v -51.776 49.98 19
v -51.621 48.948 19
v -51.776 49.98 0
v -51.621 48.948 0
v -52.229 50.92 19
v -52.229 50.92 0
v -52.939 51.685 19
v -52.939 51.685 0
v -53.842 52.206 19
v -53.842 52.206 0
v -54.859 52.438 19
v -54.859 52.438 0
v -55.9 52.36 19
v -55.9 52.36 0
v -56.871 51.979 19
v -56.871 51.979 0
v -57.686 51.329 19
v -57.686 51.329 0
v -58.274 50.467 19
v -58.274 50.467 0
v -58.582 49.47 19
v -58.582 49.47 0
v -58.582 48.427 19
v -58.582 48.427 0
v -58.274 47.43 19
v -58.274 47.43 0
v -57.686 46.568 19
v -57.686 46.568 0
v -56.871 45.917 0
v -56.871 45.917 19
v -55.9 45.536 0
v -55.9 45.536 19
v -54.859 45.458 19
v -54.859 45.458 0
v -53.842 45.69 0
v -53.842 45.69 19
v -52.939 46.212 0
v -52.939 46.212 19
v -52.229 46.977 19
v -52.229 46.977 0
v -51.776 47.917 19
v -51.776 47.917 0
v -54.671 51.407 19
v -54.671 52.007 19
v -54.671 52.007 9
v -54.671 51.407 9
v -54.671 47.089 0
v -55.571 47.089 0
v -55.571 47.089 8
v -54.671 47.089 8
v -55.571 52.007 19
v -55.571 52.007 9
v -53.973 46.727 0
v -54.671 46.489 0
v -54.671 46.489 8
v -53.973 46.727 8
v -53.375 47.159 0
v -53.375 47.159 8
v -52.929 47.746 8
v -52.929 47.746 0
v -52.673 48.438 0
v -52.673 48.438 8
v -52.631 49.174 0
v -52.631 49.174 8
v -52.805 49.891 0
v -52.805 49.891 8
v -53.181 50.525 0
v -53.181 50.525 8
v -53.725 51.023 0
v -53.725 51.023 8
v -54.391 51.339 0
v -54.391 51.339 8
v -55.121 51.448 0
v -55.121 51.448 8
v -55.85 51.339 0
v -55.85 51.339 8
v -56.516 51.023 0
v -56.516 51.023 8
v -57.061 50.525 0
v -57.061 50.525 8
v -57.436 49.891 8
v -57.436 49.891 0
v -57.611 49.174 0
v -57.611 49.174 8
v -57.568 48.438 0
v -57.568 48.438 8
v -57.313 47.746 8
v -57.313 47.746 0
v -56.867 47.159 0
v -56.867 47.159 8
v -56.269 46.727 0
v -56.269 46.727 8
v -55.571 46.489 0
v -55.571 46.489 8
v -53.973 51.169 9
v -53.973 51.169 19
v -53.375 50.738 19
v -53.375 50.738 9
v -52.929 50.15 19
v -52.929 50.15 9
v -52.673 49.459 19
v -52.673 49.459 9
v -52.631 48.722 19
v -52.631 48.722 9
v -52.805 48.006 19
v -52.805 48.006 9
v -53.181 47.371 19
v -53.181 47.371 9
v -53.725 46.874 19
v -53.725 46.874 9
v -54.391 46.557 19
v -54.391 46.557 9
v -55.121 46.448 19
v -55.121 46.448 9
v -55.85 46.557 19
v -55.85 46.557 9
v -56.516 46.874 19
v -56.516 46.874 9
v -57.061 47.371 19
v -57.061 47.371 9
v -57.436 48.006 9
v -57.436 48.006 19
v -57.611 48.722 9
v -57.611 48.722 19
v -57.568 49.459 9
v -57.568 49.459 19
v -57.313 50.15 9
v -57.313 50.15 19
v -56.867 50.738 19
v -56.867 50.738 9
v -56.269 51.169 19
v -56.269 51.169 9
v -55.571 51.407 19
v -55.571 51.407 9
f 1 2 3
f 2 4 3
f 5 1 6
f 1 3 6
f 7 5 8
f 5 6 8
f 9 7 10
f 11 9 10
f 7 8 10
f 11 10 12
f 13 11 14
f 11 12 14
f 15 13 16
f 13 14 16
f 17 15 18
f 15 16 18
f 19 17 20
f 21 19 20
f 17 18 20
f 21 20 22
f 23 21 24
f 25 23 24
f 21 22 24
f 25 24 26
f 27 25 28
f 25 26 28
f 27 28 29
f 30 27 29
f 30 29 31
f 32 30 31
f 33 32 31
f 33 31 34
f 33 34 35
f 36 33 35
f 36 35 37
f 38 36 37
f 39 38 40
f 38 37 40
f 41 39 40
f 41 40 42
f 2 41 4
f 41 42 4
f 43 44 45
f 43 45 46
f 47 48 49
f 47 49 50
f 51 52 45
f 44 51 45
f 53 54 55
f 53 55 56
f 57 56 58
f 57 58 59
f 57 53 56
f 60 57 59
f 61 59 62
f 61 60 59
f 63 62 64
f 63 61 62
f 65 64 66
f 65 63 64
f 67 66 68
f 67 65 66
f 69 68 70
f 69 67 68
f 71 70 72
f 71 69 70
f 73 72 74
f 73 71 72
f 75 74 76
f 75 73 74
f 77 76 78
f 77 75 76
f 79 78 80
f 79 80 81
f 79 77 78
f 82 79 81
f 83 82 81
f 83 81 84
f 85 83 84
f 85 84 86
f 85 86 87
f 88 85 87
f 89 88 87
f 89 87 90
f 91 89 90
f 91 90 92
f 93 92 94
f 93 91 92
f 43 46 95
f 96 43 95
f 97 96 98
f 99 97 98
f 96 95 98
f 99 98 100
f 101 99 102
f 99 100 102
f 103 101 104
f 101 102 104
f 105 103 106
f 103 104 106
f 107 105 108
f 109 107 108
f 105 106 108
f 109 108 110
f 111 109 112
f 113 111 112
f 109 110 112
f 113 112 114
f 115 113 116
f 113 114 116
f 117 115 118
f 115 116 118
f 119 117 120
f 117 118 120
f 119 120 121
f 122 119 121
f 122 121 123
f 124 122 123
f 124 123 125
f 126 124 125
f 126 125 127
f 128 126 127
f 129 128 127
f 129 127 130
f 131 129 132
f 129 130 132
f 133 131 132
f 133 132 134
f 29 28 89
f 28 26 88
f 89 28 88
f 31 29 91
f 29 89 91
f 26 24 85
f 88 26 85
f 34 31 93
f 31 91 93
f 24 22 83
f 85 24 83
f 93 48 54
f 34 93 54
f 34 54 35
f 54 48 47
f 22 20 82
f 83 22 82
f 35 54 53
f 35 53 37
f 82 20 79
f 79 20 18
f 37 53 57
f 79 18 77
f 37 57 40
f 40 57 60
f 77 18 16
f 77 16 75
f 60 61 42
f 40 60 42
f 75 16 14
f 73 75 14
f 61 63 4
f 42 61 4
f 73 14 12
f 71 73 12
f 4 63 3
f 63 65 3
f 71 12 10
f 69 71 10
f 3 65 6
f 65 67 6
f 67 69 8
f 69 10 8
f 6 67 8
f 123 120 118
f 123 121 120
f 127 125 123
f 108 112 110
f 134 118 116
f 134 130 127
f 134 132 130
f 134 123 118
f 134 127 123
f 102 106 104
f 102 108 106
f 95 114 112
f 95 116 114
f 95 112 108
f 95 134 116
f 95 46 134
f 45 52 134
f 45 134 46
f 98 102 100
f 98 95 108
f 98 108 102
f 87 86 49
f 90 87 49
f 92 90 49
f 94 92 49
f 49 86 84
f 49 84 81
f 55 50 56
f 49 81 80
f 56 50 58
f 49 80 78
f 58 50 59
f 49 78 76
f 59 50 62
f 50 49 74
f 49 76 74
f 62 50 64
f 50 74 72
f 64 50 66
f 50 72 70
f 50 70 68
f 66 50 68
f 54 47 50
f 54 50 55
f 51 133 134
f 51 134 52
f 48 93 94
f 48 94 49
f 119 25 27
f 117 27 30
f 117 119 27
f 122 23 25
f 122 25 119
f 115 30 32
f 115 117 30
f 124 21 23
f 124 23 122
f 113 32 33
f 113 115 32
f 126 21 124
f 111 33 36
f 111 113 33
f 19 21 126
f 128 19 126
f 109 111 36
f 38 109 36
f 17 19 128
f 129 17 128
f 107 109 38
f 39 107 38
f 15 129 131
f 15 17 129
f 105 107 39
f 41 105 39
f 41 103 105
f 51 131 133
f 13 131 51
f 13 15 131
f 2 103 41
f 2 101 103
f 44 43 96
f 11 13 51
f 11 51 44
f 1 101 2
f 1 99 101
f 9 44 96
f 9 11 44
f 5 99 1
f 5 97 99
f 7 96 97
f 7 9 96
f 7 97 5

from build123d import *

# Parameters (mm, degrees)
CROQUIS1_R              = 3.5
SALIENTE_EXTRUIR1_DEPTH = 8
CROQUIS2_R              = 3.5
SALIENTE_EXTRUIR2_DEPTH = 1
CROQUIS3_R              = 3.5
SALIENTE_EXTRUIR3_DEPTH = 10


with BuildPart() as part:
    # Croquis1 → Saliente-Extruir1 (new body)
    with BuildSketch(Plane.XY):
        with Locations((-55.120752438, 48.948230875)):
            Circle(CROQUIS1_R)
        with BuildLine():
            Line((-55.570752438, 46.489064349), (-55.570752438, 47.089064349))
            Line((-55.570752438, 47.089064349), (-54.670752438, 47.089064349))
            Line((-54.670752438, 47.089064349), (-54.670752438, 46.489064349))
            ThreePointArc((-54.670752438, 46.489064349), (-55.120752438, 51.448230875), (-55.570752438, 46.489064349))
        make_face(mode=Mode.SUBTRACT)
    extrude(amount=SALIENTE_EXTRUIR1_DEPTH)

    # Croquis2 → Saliente-Extruir2 (add)
    with BuildSketch(Plane.XY.offset(8)):
        with Locations((-55.120752438, 48.948230875)):
            Circle(CROQUIS2_R)
    extrude(amount=SALIENTE_EXTRUIR2_DEPTH)

    # Croquis3 → Saliente-Extruir3 (add)
    with BuildSketch(Plane.XY.offset(9)):
        with Locations((-55.120752438, 48.948230875)):
            Circle(CROQUIS3_R)
        with BuildLine():
            Line((-55.570752438, 51.4073974), (-55.570752438, 52.0073974))
            Line((-55.570752438, 52.0073974), (-54.670752438, 52.0073974))
            Line((-54.670752438, 52.0073974), (-54.670752438, 51.4073974))
            ThreePointArc((-54.670752438, 51.4073974), (-55.120752438, 46.448230875), (-55.570752438, 51.4073974))
        make_face(mode=Mode.SUBTRACT)
    extrude(amount=SALIENTE_EXTRUIR3_DEPTH)


solid = part.part
